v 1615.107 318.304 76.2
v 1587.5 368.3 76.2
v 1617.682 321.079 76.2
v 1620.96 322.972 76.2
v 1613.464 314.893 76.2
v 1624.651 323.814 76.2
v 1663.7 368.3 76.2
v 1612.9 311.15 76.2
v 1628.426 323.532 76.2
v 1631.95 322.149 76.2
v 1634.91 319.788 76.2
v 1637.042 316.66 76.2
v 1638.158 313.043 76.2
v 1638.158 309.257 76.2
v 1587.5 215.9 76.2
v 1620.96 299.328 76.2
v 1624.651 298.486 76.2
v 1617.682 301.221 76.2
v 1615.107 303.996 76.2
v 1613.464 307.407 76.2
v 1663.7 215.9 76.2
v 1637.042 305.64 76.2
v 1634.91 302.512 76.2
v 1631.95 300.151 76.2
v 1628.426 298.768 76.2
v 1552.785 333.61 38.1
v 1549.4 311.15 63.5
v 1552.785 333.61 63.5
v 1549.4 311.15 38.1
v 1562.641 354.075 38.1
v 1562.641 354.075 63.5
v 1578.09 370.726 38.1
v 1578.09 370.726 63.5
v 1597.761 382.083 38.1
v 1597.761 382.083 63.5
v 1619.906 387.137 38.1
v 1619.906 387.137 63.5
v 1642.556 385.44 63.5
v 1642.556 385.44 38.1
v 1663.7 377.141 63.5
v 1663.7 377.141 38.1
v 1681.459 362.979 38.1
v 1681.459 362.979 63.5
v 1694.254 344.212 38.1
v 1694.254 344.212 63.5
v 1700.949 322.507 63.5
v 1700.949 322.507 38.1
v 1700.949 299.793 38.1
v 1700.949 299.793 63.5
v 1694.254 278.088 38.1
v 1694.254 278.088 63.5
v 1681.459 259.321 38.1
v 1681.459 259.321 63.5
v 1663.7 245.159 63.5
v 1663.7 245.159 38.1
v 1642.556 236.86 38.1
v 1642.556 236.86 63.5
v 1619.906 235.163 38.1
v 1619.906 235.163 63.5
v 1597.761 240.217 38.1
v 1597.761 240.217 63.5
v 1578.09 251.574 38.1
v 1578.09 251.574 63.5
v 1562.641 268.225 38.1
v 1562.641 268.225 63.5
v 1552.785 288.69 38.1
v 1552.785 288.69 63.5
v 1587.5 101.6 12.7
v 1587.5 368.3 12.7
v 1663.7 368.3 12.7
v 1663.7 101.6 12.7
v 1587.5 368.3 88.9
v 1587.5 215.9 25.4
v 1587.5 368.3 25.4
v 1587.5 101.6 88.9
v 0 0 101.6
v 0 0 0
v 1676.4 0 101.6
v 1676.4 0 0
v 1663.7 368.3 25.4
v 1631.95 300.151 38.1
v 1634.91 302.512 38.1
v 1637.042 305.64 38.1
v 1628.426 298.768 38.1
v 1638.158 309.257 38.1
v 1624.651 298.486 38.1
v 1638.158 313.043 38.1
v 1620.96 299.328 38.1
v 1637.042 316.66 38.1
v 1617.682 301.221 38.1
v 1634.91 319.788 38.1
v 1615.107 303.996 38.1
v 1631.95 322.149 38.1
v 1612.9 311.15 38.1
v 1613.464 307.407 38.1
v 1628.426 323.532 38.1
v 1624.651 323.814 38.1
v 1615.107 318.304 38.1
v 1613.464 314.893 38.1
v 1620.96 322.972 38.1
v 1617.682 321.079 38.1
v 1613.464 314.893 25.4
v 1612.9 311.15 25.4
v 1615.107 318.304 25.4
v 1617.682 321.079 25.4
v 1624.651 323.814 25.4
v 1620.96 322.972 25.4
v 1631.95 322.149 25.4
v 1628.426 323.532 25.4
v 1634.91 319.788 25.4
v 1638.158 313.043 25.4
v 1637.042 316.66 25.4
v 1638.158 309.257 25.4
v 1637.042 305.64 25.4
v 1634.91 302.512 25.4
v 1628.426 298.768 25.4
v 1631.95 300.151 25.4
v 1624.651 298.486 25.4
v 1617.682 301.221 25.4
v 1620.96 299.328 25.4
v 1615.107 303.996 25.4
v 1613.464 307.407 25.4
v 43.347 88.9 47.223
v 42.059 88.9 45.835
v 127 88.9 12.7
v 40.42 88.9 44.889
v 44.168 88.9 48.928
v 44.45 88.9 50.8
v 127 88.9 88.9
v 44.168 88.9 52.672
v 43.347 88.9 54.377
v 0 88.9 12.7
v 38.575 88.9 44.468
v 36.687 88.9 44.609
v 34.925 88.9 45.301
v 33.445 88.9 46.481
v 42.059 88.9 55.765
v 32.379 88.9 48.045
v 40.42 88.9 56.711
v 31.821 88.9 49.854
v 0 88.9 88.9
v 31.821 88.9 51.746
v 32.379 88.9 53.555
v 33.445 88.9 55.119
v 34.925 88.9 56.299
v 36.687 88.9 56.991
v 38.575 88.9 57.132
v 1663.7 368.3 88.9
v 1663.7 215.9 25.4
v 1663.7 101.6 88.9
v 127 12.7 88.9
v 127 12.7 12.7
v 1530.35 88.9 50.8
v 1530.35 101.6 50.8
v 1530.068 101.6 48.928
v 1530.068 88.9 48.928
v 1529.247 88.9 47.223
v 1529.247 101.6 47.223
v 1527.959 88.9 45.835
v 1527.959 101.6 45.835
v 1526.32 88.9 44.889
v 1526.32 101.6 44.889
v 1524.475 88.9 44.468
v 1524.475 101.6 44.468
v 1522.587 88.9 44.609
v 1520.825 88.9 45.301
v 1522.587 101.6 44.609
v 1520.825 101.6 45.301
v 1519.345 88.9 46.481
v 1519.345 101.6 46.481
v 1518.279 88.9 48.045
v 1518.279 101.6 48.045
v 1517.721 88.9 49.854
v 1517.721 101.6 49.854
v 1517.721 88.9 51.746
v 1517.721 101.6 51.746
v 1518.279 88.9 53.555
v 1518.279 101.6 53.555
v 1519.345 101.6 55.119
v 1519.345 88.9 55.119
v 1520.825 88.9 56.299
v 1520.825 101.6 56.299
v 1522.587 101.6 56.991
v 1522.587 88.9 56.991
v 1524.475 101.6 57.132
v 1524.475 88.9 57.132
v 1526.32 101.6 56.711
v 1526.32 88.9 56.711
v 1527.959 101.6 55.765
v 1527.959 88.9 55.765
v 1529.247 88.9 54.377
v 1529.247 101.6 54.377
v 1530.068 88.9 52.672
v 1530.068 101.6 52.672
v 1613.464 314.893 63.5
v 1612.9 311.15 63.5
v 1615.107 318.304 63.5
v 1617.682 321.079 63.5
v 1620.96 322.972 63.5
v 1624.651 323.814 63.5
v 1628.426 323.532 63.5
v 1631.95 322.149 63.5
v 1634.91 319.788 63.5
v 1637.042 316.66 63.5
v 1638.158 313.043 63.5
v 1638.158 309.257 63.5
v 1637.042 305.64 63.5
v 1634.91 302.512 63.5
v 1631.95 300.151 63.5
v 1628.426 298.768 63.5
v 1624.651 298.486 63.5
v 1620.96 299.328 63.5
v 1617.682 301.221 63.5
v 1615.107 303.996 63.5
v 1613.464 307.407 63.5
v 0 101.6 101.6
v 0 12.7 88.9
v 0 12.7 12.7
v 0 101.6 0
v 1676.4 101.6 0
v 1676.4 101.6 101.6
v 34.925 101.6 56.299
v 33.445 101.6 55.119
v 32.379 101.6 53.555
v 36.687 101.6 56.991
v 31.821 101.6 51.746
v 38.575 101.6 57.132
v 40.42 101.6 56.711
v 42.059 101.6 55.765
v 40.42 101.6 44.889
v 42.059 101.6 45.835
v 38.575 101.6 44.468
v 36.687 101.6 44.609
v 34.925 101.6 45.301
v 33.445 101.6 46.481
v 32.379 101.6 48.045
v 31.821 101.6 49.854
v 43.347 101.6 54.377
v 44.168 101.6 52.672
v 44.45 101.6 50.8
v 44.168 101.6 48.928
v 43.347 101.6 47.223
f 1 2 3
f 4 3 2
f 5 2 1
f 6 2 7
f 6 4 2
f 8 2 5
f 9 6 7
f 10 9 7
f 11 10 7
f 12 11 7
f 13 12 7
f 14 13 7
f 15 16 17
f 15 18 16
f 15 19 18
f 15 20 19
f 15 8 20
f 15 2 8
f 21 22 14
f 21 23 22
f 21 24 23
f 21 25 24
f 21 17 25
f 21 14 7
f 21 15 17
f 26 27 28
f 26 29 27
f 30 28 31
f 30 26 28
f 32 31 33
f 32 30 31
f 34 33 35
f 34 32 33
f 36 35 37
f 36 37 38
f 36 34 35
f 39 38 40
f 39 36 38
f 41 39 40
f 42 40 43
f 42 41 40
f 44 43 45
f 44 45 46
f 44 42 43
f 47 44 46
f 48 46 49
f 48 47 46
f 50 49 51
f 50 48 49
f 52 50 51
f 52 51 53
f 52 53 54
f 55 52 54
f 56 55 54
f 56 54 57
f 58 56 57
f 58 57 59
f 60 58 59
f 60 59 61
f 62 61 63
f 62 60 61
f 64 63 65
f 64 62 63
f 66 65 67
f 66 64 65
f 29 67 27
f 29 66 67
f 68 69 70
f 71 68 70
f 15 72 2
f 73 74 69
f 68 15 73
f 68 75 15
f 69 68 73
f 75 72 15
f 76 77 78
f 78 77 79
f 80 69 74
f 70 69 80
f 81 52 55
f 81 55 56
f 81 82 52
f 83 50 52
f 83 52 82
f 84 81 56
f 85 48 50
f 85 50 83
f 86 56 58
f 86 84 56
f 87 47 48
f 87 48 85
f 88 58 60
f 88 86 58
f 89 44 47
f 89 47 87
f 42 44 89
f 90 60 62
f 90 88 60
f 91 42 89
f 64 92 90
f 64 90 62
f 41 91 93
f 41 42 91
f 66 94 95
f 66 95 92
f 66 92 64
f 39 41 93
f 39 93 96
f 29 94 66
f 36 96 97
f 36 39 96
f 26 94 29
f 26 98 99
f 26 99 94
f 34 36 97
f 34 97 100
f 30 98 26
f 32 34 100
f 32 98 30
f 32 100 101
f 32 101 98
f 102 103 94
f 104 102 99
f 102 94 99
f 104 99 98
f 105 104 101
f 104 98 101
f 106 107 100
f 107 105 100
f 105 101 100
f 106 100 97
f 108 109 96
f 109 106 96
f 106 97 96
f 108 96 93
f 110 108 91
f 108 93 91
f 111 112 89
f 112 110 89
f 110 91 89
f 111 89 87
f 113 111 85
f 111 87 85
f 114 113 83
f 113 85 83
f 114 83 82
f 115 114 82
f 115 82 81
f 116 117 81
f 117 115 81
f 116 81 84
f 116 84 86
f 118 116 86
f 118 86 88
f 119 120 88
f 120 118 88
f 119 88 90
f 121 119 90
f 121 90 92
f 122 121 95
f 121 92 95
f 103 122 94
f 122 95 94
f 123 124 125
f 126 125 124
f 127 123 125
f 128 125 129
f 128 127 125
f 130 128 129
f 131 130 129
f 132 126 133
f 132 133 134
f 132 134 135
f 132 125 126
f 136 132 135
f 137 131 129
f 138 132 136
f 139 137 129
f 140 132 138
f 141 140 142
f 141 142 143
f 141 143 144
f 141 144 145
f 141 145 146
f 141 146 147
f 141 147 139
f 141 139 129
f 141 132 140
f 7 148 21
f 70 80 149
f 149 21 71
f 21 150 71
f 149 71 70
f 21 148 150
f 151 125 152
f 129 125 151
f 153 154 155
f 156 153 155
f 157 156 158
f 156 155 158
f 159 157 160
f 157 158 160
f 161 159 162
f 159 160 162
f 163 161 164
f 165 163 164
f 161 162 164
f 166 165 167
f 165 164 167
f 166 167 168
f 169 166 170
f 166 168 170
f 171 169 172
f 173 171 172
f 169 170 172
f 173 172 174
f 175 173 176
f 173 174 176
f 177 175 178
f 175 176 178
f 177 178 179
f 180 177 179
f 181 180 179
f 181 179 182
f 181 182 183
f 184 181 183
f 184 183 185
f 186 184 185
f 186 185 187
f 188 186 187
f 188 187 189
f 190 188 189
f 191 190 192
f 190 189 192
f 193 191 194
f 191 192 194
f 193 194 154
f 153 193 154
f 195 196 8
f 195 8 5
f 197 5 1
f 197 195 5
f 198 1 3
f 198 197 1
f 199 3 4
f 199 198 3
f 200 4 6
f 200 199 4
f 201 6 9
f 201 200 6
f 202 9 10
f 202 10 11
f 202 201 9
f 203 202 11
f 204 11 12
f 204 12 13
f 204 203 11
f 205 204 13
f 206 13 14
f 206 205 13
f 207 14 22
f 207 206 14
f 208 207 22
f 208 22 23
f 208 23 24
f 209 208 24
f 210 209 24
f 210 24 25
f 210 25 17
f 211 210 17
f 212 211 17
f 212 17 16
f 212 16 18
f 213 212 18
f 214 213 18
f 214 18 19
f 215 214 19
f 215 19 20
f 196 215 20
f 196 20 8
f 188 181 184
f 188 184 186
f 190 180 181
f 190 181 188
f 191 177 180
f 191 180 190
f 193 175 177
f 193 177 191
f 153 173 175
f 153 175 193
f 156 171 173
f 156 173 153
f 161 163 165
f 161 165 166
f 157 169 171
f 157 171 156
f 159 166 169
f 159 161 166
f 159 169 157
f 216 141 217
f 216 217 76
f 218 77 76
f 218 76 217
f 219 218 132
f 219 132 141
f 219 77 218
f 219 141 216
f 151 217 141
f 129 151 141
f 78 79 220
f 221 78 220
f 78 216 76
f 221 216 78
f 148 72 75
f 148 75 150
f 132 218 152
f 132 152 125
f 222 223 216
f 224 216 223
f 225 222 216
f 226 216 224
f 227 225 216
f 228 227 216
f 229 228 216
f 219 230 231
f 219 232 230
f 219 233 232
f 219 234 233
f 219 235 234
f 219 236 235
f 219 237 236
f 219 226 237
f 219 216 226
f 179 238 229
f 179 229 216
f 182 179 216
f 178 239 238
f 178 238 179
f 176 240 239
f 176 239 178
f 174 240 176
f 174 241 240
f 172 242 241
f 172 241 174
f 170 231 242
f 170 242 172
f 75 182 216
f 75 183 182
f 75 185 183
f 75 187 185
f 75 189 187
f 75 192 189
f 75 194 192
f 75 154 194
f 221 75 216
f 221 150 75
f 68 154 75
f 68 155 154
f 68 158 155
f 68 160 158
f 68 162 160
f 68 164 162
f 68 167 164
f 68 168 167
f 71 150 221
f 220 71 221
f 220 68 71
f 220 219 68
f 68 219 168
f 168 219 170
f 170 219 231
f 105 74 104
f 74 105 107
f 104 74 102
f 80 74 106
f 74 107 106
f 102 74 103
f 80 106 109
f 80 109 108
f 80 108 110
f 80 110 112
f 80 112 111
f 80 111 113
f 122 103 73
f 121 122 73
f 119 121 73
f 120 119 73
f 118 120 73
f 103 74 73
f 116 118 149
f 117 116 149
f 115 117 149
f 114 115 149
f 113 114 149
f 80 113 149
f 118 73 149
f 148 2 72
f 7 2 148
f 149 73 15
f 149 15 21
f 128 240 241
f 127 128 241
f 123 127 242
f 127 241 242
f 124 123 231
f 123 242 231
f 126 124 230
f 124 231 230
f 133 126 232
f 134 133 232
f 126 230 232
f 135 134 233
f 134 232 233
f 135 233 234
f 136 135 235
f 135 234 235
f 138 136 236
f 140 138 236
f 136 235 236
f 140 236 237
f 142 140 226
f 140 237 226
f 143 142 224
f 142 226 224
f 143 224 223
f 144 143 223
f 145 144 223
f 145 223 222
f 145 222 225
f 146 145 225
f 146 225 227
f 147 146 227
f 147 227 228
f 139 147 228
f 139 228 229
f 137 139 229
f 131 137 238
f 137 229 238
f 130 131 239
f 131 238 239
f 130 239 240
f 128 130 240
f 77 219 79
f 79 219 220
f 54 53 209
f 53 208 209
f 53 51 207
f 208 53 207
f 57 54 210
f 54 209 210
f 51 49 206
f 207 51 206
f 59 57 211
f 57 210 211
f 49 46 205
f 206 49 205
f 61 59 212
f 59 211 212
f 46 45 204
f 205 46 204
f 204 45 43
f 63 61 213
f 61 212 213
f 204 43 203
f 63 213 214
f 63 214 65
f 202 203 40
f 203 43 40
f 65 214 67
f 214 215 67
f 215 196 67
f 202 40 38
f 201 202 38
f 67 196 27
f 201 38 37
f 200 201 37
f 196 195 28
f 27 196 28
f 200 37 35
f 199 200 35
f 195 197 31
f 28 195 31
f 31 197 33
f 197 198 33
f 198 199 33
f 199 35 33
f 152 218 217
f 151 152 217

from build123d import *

# Parameters (mm, degrees)
SKETCH1_W                       = 1676.4
SKETCH1_H                       = 101.6
BOSS_EXTRUDE1_DEPTH             = 101.6
SKETCH3_W                       = 76.2
SKETCH3_H                       = 76.2
CUT_EXTRUDE1_DEPTH              = 127
SKETCH5_W                       = 76.2
SKETCH5_H                       = 76.2
BOSS_EXTRUDE2_DEPTH             = 114.3
SKETCH6_W                       = 76.2
SKETCH6_H                       = 12.7
BOSS_EXTRUDE3_DEPTH             = 152.4
BOSS_EXTRUDE4_REACH             = 52.8
SKETCH7_R                       = 12.7
BOSS_EXTRUDE4_DIRECTION_2_REACH = 52.8
SKETCH8_R                       = 76.2
BOSS_EXTRUDE5_DEPTH             = 12.7
BOSS_EXTRUDE5_DEPTH_BACK        = 12.7
SKETCH9_R                       = 6.35
CUT_EXTRUDE2_DEPTH              = 12.7


with BuildPart() as part:
    # Sketch1 → Boss-Extrude1 (new body)
    with BuildSketch(Plane.XY):
        with Locations((838.2, 50.8)):
            Rectangle(SKETCH1_W, SKETCH1_H)
    extrude(amount=BOSS_EXTRUDE1_DEPTH)

    # Sketch3 → Cut-Extrude1 (cut)
    with BuildSketch(Plane.ZY):
        with Locations((50.8, 50.8)):
            Rectangle(SKETCH3_W, SKETCH3_H)
    extrude(amount=-CUT_EXTRUDE1_DEPTH, mode=Mode.SUBTRACT)

    # Sketch5 → Boss-Extrude2 (add)
    with BuildSketch(Plane(origin=(0, 101.6, 0), x_dir=(1, 0, 0), z_dir=(0, 1, 0))):
        with Locations((1625.6, -50.8)):
            Rectangle(SKETCH5_W, SKETCH5_H)
    extrude(amount=BOSS_EXTRUDE2_DEPTH)

    # Sketch6 → Boss-Extrude3 (add)
    with BuildSketch(Plane(origin=(0, 215.9, 0), x_dir=(1, 0, 0), z_dir=(0, 1, 0))):
        with Locations((1625.6, -19.05)):
            Rectangle(SKETCH6_W, SKETCH6_H)
        with Locations((1625.6, -82.55)):
            Rectangle(SKETCH6_W, SKETCH6_H)
    extrude(amount=BOSS_EXTRUDE3_DEPTH)

    # Boss-Extrude4: up to this face of the body (flat: up to its plane)
    boss_extrude4_end = Plane(part.part.faces().sort_by_distance((1625.6, 292.1, 25.4))[0])
    # Sketch7 → Boss-Extrude4 (add, up to the picked face)
    with BuildSketch(Plane(origin=(0, 0, 50.8), x_dir=(-1, 0, 0), z_dir=(0, 0, -1)), mode=Mode.PRIVATE) as boss_extrude4_sk1:
        with Locations((-1625.6, 311.15)):
            Circle(SKETCH7_R)
    boss_extrude4_tool1 = split(extrude(boss_extrude4_sk1.sketch, amount=BOSS_EXTRUDE4_REACH, mode=Mode.PRIVATE), bisect_by=boss_extrude4_end, keep=Keep.BOTH, mode=Mode.PRIVATE)
    add(boss_extrude4_tool1.solids().sort_by_distance((1625.6, 311.15, 50.8))[0])

    # Boss-Extrude4 direction 2: up to this face of the body (flat: up to its plane)
    boss_extrude4_direction_2_end = Plane(part.part.faces().sort_by_distance((1625.6, 292.1, 76.2))[0])
    # Sketch7 → Boss-Extrude4 direction 2 (add, up to the picked face)
    with BuildSketch(Plane(origin=(0, 0, 50.8), x_dir=(-1, 0, 0), z_dir=(0, 0, -1)), mode=Mode.PRIVATE) as boss_extrude4_direction_2_sk1:
        with Locations((-1625.6, 311.15)):
            Circle(SKETCH7_R)
    boss_extrude4_direction_2_tool1 = split(extrude(boss_extrude4_direction_2_sk1.sketch, amount=-BOSS_EXTRUDE4_DIRECTION_2_REACH, mode=Mode.PRIVATE), bisect_by=boss_extrude4_direction_2_end, keep=Keep.BOTH, mode=Mode.PRIVATE)
    add(boss_extrude4_direction_2_tool1.solids().sort_by_distance((1625.6, 311.15, 50.8))[0])

    # Sketch8 → Boss-Extrude5 (add, two sides)
    with BuildSketch(Plane(origin=(0, 0, 50.8), x_dir=(-1, 0, 0), z_dir=(0, 0, -1))) as boss_extrude5_sk:
        with Locations((-1625.6, 311.15)):
            Circle(SKETCH8_R)
    extrude(amount=BOSS_EXTRUDE5_DEPTH)
    extrude(boss_extrude5_sk.sketch, amount=-BOSS_EXTRUDE5_DEPTH_BACK)

    # Sketch9 → Cut-Extrude2 (cut)
    with BuildSketch(Plane(origin=(0, 101.6, 0), x_dir=(1, 0, 0), z_dir=(0, 1, 0))):
        with Locations((38.1, -50.8)):
            Circle(SKETCH9_R)
        with Locations((1524, -50.8)):
            Circle(SKETCH9_R)
    extrude(amount=-CUT_EXTRUDE2_DEPTH, mode=Mode.SUBTRACT)


solid = part.part
